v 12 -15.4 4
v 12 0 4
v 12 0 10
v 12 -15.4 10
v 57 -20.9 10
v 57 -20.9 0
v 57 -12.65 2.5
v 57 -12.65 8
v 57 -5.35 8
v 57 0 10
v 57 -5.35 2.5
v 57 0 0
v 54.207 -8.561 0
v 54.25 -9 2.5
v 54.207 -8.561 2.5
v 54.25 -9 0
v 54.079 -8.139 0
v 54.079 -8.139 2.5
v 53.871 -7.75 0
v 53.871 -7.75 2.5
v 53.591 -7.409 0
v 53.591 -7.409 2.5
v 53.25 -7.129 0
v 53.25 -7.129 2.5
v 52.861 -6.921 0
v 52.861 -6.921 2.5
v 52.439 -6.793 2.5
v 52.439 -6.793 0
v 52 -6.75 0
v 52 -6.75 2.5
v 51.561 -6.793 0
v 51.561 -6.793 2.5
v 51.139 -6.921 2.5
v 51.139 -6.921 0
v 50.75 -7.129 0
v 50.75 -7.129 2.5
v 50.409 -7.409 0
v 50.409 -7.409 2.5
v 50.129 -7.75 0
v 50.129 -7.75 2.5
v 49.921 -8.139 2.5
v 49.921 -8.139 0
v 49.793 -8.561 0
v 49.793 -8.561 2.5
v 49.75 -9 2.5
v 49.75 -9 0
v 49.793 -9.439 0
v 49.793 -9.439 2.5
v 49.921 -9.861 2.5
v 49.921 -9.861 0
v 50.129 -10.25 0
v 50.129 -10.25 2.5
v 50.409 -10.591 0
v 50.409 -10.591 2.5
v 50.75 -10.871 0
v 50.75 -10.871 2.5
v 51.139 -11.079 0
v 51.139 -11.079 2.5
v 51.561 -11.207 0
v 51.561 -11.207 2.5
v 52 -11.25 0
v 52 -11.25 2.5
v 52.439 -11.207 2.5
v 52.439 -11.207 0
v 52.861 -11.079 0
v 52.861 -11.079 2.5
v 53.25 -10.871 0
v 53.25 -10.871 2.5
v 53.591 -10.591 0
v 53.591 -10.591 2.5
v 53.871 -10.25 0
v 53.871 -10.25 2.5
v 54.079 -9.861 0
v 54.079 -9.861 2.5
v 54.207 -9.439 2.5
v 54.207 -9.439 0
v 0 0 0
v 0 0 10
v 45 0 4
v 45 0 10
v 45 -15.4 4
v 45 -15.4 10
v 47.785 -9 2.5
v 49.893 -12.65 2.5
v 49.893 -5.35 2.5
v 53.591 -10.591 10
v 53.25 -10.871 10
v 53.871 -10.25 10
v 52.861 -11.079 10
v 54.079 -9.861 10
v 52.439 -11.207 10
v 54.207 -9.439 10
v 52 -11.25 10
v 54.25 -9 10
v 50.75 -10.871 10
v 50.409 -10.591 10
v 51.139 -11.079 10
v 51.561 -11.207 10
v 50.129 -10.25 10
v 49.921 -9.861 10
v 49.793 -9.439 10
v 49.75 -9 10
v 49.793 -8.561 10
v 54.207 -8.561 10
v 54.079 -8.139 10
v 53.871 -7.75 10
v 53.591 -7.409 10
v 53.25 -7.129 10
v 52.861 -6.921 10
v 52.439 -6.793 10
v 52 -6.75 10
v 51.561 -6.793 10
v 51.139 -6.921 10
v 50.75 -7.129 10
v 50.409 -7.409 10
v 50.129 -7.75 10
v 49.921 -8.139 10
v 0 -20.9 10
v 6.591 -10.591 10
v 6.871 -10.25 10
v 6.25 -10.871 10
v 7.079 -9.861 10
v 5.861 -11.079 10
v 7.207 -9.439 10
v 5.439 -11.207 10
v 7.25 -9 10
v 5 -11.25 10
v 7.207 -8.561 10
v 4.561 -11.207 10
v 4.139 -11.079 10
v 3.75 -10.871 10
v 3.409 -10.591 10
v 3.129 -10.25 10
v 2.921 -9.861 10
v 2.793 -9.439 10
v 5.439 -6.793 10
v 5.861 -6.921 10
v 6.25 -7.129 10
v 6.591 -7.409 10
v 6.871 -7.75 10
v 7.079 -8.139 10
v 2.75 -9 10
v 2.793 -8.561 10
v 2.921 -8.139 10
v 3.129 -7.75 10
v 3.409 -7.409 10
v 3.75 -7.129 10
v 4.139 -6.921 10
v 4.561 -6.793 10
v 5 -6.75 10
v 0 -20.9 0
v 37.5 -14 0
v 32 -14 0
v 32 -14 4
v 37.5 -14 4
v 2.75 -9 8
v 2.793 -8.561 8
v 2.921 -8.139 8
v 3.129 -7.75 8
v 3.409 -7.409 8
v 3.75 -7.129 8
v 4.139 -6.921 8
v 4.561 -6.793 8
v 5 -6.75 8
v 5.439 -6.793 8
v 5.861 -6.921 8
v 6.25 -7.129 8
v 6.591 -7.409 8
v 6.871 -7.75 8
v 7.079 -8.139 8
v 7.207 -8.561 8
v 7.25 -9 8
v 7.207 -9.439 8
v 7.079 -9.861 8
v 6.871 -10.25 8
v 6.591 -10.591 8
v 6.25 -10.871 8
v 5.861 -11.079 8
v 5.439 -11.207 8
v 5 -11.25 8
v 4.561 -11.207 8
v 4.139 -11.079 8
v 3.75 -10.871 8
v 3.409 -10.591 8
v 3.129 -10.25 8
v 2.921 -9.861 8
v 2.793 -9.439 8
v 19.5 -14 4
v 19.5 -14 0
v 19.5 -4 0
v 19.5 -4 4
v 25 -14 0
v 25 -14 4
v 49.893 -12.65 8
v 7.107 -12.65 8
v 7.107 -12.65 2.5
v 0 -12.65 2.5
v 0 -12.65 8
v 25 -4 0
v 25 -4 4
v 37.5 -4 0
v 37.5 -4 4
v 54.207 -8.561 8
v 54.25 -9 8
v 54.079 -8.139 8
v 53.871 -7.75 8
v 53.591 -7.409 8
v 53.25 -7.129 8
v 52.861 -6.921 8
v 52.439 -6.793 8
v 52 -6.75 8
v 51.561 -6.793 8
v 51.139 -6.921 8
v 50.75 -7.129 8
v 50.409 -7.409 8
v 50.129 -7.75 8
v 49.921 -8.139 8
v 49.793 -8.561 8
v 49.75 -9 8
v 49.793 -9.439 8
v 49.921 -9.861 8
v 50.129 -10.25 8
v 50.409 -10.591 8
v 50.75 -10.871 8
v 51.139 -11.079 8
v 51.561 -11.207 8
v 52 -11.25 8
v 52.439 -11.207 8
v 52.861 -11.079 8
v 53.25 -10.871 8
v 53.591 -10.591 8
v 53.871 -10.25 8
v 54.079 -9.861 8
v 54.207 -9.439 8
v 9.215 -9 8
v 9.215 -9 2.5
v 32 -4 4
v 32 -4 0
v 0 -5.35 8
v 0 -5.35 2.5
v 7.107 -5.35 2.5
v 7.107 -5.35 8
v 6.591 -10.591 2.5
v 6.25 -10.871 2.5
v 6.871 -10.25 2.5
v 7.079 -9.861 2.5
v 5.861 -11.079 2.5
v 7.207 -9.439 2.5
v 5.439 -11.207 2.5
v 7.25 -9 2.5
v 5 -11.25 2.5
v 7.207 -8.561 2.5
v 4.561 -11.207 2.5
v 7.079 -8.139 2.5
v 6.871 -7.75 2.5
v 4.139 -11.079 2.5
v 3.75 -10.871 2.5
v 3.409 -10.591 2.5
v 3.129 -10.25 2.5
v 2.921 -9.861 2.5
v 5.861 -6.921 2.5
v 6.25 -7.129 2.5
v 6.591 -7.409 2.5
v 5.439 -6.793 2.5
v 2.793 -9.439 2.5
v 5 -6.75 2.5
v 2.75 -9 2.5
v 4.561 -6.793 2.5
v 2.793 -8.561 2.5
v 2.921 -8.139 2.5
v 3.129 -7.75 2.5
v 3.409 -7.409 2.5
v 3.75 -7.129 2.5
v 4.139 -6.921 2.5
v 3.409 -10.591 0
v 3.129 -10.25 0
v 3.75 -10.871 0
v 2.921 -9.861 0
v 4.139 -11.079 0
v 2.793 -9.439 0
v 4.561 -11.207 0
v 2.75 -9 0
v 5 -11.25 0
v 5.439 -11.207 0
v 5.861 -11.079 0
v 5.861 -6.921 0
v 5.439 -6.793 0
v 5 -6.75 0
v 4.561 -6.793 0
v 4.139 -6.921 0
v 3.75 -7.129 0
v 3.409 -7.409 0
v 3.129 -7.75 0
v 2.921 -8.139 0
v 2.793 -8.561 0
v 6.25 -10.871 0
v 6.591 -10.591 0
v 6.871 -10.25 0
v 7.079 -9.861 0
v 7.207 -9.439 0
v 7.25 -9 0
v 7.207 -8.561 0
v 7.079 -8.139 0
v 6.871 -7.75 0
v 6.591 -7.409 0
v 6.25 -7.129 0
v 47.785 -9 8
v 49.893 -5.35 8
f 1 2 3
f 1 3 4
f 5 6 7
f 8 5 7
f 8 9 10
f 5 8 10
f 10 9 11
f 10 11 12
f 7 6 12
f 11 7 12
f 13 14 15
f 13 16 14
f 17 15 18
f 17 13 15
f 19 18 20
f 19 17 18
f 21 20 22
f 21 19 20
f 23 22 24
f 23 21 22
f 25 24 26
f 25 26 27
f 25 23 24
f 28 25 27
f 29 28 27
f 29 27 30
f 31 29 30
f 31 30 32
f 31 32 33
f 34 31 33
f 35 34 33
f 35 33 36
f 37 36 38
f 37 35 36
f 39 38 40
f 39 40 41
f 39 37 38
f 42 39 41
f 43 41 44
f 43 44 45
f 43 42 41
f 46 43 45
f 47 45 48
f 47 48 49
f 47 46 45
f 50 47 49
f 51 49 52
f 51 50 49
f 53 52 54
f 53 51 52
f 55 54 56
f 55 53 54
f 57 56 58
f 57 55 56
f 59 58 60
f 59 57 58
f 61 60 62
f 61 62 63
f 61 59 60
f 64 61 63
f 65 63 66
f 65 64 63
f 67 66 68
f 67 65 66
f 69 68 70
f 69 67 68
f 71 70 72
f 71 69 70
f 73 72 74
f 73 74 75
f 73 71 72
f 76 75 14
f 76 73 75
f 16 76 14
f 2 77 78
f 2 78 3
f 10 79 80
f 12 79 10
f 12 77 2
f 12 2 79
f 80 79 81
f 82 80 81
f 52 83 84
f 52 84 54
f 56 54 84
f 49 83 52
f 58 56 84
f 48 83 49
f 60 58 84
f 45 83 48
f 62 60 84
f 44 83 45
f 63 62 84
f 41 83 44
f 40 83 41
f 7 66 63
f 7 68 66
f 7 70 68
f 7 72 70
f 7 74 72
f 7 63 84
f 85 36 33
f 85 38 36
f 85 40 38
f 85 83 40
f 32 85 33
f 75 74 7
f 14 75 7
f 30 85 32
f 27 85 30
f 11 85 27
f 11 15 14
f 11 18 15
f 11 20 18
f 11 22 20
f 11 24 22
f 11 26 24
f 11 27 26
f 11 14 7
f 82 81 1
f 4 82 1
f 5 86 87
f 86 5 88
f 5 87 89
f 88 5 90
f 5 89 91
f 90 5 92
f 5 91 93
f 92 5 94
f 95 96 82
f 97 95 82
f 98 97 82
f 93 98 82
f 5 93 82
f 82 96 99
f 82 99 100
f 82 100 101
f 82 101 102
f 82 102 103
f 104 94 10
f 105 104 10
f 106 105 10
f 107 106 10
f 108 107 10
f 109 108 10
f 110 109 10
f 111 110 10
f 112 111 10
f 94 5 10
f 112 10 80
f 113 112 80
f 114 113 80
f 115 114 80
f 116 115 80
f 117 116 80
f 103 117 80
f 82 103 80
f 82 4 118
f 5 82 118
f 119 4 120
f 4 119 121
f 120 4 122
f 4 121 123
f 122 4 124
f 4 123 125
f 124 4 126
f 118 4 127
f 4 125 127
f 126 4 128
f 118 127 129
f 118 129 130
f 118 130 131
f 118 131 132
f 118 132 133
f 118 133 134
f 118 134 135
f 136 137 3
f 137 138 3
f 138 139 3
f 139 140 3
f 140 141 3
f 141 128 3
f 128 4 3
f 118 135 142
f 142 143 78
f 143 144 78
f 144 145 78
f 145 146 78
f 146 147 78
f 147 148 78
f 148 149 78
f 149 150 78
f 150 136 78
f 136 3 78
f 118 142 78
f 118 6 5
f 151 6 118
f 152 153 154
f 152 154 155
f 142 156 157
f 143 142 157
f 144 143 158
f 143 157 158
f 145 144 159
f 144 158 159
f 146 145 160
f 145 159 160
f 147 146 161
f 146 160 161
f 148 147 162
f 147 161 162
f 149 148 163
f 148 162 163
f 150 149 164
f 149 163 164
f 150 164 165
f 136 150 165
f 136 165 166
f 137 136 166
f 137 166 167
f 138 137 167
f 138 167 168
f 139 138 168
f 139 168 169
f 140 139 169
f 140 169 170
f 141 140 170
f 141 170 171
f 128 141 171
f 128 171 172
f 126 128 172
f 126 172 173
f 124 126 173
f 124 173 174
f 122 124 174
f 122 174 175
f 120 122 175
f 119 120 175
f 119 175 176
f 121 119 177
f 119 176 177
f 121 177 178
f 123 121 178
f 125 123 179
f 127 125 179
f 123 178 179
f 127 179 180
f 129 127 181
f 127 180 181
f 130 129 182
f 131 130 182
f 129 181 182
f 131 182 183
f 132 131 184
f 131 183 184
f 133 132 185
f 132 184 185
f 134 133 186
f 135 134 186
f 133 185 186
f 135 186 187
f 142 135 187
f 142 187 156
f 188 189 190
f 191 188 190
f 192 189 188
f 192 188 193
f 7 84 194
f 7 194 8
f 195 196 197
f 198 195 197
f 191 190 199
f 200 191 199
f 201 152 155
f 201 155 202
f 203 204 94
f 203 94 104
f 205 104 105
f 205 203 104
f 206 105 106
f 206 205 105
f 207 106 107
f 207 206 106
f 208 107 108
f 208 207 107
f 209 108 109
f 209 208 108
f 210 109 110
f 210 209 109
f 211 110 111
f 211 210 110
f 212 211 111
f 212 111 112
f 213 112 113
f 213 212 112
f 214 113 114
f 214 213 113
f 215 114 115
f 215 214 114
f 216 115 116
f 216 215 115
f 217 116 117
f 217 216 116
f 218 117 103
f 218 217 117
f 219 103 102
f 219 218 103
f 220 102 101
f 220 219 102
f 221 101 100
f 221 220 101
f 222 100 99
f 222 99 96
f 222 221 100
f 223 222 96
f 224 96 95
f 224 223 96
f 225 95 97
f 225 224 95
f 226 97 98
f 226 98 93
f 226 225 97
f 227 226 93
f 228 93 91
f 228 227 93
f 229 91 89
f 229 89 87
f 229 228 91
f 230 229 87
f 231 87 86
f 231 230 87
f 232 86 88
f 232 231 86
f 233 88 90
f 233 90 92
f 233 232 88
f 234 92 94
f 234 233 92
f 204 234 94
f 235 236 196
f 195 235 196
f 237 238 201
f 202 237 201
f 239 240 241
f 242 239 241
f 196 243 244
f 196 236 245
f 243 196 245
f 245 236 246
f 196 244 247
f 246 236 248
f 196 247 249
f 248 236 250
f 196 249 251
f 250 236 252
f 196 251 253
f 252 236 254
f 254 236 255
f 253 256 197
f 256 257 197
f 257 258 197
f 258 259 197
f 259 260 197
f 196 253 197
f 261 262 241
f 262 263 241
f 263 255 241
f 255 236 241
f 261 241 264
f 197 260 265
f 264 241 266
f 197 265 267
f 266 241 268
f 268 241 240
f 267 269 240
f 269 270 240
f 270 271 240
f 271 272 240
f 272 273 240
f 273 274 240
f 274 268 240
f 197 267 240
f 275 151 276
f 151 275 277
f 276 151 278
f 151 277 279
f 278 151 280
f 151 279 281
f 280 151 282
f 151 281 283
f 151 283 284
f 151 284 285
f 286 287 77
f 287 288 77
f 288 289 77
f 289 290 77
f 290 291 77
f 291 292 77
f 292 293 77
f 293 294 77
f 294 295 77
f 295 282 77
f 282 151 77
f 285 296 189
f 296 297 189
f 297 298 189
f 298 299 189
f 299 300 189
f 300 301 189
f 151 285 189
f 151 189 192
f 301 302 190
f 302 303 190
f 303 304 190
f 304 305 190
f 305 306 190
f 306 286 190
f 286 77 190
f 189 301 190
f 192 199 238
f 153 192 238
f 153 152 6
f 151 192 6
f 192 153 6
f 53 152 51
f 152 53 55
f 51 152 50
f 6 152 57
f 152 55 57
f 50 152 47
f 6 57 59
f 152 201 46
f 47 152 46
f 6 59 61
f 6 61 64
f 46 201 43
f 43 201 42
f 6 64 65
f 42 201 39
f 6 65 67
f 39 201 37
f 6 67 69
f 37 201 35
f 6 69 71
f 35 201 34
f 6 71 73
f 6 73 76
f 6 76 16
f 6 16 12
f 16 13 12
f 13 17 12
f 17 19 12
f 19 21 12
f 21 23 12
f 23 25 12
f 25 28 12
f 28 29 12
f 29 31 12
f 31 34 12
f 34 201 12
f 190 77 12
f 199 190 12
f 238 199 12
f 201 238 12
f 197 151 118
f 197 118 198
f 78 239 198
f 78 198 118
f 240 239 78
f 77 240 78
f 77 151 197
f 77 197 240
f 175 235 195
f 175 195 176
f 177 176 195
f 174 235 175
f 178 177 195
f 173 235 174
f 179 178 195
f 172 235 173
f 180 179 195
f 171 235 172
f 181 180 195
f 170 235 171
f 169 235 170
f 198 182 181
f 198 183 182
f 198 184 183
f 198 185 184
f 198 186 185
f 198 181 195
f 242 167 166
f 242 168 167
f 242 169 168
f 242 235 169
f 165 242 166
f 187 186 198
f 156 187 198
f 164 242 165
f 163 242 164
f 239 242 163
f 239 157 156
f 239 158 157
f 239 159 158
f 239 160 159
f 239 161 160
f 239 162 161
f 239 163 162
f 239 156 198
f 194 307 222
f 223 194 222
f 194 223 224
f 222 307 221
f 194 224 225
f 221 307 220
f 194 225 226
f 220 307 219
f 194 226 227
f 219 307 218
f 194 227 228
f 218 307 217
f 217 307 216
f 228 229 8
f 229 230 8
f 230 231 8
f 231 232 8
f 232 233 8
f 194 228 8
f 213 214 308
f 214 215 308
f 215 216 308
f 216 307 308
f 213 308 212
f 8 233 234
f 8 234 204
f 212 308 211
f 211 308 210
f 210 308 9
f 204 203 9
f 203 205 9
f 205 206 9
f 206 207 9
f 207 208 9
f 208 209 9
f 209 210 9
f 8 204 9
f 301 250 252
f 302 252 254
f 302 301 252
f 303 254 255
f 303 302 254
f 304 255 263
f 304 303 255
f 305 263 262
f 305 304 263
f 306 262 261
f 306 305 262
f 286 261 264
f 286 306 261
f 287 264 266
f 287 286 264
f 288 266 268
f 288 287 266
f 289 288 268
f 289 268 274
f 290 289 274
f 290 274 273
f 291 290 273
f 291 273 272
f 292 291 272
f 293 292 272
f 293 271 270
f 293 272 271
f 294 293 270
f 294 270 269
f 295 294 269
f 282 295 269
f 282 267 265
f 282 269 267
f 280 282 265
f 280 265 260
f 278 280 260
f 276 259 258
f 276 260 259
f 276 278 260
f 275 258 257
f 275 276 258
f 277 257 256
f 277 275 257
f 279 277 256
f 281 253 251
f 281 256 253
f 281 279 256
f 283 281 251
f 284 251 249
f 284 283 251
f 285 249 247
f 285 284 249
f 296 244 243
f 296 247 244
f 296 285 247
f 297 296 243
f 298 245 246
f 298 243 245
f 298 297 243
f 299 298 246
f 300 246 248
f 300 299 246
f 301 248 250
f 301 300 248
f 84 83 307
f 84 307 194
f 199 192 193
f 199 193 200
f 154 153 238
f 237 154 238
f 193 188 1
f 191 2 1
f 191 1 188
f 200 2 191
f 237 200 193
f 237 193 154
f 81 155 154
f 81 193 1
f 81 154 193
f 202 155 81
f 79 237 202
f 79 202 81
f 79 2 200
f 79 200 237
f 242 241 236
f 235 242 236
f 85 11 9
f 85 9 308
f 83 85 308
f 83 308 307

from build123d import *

# Parameters (mm, degrees)
ESQUISSE1_W             = 57
ESQUISSE1_H             = 20.9
ESQUISSE1_R             = 2.25
ESQUISSE1_W_2           = 5.5
ESQUISSE1_H_2           = 10
BOSS_EXTRU_2_DEPTH      = 4
ESQUISSE2_W             = 16.5
ESQUISSE2_H             = 5.5
ESQUISSE2_R             = 2.25
BOSS_EXTRU_3_DEPTH      = 6
ENL_V_START             = -7.5
ESQUISSE4_R             = 2.25
ENL_V_MAT_EXTRU_2_DEPTH = 5.5


with BuildPart() as part:
    # Esquisse1 → Boss.-Extru.2 (new body)
    with BuildSketch(Plane.XY):
        with Locations((28.5, -10.45)):
            Rectangle(ESQUISSE1_W, ESQUISSE1_H)
        with Locations((5, -9)):
            Circle(ESQUISSE1_R, mode=Mode.SUBTRACT)
        with Locations((52, -9)):
            Circle(ESQUISSE1_R, mode=Mode.SUBTRACT)
        with Locations((34.75, -9)):
            Rectangle(ESQUISSE1_W_2, ESQUISSE1_H_2, mode=Mode.SUBTRACT)
        with Locations((22.25, -9)):
            Rectangle(ESQUISSE1_W_2, ESQUISSE1_H_2, mode=Mode.SUBTRACT)
    extrude(amount=BOSS_EXTRU_2_DEPTH)

    # Esquisse2 → Boss.-Extru.3 (add)
    # profile 1 of 2: a face of its own
    with BuildSketch(Plane.XY.offset(4)):
        with Locations((36.75, -18.15)):
            Rectangle(ESQUISSE2_W, ESQUISSE2_H)
    # profile 2 of 2: a face of its own
    with BuildSketch(Plane.XY.offset(4)):
        Polygon((57, -20.9), (57, 0), (45, 0), (45, -15.4), (45, -20.9), align=None)
        with Locations((52, -9)):
            Circle(ESQUISSE2_R, mode=Mode.SUBTRACT)
    boss_extru_3 = extrude(amount=BOSS_EXTRU_3_DEPTH)

    # Esquisse4 → Enlèv. mat.-Extru.2 (cut)
    # profile 1 of 2: a face of its own
    with BuildSketch(Plane.XY.offset(10).offset(ENL_V_START)):
        Polygon((56.214656965, -9), (54.107328483, -5.35), (49.892671517, -5.35), (47.785343035, -9), (49.892671517, -12.65), (54.107328483, -12.65), align=None)
        with Locations((52, -9)):
            Circle(ESQUISSE4_R, mode=Mode.SUBTRACT)
    # profile 2 of 2: a face of its own
    with BuildSketch(Plane.XY.offset(10).offset(ENL_V_START)):
        Polygon((57, -5.35), (54.107328483, -5.35), (56.214656965, -9), (54.107328483, -12.65), (57, -12.65), align=None)
    enl_v_mat_extru_2 = extrude(amount=ENL_V_MAT_EXTRU_2_DEPTH, mode=Mode.SUBTRACT)

    # Symétrie3: Boss.-Extru.3, Enlèv. mat.-Extru.2 across plane
    add(boss_extru_3.mirror(Plane(origin=(28.5, 0, 0), x_dir=(0, 0, 1), z_dir=(1, 0, 0))))
    add(enl_v_mat_extru_2.mirror(Plane(origin=(28.5, 0, 0), x_dir=(0, 0, 1), z_dir=(1, 0, 0))), mode=Mode.SUBTRACT)


solid = part.part
